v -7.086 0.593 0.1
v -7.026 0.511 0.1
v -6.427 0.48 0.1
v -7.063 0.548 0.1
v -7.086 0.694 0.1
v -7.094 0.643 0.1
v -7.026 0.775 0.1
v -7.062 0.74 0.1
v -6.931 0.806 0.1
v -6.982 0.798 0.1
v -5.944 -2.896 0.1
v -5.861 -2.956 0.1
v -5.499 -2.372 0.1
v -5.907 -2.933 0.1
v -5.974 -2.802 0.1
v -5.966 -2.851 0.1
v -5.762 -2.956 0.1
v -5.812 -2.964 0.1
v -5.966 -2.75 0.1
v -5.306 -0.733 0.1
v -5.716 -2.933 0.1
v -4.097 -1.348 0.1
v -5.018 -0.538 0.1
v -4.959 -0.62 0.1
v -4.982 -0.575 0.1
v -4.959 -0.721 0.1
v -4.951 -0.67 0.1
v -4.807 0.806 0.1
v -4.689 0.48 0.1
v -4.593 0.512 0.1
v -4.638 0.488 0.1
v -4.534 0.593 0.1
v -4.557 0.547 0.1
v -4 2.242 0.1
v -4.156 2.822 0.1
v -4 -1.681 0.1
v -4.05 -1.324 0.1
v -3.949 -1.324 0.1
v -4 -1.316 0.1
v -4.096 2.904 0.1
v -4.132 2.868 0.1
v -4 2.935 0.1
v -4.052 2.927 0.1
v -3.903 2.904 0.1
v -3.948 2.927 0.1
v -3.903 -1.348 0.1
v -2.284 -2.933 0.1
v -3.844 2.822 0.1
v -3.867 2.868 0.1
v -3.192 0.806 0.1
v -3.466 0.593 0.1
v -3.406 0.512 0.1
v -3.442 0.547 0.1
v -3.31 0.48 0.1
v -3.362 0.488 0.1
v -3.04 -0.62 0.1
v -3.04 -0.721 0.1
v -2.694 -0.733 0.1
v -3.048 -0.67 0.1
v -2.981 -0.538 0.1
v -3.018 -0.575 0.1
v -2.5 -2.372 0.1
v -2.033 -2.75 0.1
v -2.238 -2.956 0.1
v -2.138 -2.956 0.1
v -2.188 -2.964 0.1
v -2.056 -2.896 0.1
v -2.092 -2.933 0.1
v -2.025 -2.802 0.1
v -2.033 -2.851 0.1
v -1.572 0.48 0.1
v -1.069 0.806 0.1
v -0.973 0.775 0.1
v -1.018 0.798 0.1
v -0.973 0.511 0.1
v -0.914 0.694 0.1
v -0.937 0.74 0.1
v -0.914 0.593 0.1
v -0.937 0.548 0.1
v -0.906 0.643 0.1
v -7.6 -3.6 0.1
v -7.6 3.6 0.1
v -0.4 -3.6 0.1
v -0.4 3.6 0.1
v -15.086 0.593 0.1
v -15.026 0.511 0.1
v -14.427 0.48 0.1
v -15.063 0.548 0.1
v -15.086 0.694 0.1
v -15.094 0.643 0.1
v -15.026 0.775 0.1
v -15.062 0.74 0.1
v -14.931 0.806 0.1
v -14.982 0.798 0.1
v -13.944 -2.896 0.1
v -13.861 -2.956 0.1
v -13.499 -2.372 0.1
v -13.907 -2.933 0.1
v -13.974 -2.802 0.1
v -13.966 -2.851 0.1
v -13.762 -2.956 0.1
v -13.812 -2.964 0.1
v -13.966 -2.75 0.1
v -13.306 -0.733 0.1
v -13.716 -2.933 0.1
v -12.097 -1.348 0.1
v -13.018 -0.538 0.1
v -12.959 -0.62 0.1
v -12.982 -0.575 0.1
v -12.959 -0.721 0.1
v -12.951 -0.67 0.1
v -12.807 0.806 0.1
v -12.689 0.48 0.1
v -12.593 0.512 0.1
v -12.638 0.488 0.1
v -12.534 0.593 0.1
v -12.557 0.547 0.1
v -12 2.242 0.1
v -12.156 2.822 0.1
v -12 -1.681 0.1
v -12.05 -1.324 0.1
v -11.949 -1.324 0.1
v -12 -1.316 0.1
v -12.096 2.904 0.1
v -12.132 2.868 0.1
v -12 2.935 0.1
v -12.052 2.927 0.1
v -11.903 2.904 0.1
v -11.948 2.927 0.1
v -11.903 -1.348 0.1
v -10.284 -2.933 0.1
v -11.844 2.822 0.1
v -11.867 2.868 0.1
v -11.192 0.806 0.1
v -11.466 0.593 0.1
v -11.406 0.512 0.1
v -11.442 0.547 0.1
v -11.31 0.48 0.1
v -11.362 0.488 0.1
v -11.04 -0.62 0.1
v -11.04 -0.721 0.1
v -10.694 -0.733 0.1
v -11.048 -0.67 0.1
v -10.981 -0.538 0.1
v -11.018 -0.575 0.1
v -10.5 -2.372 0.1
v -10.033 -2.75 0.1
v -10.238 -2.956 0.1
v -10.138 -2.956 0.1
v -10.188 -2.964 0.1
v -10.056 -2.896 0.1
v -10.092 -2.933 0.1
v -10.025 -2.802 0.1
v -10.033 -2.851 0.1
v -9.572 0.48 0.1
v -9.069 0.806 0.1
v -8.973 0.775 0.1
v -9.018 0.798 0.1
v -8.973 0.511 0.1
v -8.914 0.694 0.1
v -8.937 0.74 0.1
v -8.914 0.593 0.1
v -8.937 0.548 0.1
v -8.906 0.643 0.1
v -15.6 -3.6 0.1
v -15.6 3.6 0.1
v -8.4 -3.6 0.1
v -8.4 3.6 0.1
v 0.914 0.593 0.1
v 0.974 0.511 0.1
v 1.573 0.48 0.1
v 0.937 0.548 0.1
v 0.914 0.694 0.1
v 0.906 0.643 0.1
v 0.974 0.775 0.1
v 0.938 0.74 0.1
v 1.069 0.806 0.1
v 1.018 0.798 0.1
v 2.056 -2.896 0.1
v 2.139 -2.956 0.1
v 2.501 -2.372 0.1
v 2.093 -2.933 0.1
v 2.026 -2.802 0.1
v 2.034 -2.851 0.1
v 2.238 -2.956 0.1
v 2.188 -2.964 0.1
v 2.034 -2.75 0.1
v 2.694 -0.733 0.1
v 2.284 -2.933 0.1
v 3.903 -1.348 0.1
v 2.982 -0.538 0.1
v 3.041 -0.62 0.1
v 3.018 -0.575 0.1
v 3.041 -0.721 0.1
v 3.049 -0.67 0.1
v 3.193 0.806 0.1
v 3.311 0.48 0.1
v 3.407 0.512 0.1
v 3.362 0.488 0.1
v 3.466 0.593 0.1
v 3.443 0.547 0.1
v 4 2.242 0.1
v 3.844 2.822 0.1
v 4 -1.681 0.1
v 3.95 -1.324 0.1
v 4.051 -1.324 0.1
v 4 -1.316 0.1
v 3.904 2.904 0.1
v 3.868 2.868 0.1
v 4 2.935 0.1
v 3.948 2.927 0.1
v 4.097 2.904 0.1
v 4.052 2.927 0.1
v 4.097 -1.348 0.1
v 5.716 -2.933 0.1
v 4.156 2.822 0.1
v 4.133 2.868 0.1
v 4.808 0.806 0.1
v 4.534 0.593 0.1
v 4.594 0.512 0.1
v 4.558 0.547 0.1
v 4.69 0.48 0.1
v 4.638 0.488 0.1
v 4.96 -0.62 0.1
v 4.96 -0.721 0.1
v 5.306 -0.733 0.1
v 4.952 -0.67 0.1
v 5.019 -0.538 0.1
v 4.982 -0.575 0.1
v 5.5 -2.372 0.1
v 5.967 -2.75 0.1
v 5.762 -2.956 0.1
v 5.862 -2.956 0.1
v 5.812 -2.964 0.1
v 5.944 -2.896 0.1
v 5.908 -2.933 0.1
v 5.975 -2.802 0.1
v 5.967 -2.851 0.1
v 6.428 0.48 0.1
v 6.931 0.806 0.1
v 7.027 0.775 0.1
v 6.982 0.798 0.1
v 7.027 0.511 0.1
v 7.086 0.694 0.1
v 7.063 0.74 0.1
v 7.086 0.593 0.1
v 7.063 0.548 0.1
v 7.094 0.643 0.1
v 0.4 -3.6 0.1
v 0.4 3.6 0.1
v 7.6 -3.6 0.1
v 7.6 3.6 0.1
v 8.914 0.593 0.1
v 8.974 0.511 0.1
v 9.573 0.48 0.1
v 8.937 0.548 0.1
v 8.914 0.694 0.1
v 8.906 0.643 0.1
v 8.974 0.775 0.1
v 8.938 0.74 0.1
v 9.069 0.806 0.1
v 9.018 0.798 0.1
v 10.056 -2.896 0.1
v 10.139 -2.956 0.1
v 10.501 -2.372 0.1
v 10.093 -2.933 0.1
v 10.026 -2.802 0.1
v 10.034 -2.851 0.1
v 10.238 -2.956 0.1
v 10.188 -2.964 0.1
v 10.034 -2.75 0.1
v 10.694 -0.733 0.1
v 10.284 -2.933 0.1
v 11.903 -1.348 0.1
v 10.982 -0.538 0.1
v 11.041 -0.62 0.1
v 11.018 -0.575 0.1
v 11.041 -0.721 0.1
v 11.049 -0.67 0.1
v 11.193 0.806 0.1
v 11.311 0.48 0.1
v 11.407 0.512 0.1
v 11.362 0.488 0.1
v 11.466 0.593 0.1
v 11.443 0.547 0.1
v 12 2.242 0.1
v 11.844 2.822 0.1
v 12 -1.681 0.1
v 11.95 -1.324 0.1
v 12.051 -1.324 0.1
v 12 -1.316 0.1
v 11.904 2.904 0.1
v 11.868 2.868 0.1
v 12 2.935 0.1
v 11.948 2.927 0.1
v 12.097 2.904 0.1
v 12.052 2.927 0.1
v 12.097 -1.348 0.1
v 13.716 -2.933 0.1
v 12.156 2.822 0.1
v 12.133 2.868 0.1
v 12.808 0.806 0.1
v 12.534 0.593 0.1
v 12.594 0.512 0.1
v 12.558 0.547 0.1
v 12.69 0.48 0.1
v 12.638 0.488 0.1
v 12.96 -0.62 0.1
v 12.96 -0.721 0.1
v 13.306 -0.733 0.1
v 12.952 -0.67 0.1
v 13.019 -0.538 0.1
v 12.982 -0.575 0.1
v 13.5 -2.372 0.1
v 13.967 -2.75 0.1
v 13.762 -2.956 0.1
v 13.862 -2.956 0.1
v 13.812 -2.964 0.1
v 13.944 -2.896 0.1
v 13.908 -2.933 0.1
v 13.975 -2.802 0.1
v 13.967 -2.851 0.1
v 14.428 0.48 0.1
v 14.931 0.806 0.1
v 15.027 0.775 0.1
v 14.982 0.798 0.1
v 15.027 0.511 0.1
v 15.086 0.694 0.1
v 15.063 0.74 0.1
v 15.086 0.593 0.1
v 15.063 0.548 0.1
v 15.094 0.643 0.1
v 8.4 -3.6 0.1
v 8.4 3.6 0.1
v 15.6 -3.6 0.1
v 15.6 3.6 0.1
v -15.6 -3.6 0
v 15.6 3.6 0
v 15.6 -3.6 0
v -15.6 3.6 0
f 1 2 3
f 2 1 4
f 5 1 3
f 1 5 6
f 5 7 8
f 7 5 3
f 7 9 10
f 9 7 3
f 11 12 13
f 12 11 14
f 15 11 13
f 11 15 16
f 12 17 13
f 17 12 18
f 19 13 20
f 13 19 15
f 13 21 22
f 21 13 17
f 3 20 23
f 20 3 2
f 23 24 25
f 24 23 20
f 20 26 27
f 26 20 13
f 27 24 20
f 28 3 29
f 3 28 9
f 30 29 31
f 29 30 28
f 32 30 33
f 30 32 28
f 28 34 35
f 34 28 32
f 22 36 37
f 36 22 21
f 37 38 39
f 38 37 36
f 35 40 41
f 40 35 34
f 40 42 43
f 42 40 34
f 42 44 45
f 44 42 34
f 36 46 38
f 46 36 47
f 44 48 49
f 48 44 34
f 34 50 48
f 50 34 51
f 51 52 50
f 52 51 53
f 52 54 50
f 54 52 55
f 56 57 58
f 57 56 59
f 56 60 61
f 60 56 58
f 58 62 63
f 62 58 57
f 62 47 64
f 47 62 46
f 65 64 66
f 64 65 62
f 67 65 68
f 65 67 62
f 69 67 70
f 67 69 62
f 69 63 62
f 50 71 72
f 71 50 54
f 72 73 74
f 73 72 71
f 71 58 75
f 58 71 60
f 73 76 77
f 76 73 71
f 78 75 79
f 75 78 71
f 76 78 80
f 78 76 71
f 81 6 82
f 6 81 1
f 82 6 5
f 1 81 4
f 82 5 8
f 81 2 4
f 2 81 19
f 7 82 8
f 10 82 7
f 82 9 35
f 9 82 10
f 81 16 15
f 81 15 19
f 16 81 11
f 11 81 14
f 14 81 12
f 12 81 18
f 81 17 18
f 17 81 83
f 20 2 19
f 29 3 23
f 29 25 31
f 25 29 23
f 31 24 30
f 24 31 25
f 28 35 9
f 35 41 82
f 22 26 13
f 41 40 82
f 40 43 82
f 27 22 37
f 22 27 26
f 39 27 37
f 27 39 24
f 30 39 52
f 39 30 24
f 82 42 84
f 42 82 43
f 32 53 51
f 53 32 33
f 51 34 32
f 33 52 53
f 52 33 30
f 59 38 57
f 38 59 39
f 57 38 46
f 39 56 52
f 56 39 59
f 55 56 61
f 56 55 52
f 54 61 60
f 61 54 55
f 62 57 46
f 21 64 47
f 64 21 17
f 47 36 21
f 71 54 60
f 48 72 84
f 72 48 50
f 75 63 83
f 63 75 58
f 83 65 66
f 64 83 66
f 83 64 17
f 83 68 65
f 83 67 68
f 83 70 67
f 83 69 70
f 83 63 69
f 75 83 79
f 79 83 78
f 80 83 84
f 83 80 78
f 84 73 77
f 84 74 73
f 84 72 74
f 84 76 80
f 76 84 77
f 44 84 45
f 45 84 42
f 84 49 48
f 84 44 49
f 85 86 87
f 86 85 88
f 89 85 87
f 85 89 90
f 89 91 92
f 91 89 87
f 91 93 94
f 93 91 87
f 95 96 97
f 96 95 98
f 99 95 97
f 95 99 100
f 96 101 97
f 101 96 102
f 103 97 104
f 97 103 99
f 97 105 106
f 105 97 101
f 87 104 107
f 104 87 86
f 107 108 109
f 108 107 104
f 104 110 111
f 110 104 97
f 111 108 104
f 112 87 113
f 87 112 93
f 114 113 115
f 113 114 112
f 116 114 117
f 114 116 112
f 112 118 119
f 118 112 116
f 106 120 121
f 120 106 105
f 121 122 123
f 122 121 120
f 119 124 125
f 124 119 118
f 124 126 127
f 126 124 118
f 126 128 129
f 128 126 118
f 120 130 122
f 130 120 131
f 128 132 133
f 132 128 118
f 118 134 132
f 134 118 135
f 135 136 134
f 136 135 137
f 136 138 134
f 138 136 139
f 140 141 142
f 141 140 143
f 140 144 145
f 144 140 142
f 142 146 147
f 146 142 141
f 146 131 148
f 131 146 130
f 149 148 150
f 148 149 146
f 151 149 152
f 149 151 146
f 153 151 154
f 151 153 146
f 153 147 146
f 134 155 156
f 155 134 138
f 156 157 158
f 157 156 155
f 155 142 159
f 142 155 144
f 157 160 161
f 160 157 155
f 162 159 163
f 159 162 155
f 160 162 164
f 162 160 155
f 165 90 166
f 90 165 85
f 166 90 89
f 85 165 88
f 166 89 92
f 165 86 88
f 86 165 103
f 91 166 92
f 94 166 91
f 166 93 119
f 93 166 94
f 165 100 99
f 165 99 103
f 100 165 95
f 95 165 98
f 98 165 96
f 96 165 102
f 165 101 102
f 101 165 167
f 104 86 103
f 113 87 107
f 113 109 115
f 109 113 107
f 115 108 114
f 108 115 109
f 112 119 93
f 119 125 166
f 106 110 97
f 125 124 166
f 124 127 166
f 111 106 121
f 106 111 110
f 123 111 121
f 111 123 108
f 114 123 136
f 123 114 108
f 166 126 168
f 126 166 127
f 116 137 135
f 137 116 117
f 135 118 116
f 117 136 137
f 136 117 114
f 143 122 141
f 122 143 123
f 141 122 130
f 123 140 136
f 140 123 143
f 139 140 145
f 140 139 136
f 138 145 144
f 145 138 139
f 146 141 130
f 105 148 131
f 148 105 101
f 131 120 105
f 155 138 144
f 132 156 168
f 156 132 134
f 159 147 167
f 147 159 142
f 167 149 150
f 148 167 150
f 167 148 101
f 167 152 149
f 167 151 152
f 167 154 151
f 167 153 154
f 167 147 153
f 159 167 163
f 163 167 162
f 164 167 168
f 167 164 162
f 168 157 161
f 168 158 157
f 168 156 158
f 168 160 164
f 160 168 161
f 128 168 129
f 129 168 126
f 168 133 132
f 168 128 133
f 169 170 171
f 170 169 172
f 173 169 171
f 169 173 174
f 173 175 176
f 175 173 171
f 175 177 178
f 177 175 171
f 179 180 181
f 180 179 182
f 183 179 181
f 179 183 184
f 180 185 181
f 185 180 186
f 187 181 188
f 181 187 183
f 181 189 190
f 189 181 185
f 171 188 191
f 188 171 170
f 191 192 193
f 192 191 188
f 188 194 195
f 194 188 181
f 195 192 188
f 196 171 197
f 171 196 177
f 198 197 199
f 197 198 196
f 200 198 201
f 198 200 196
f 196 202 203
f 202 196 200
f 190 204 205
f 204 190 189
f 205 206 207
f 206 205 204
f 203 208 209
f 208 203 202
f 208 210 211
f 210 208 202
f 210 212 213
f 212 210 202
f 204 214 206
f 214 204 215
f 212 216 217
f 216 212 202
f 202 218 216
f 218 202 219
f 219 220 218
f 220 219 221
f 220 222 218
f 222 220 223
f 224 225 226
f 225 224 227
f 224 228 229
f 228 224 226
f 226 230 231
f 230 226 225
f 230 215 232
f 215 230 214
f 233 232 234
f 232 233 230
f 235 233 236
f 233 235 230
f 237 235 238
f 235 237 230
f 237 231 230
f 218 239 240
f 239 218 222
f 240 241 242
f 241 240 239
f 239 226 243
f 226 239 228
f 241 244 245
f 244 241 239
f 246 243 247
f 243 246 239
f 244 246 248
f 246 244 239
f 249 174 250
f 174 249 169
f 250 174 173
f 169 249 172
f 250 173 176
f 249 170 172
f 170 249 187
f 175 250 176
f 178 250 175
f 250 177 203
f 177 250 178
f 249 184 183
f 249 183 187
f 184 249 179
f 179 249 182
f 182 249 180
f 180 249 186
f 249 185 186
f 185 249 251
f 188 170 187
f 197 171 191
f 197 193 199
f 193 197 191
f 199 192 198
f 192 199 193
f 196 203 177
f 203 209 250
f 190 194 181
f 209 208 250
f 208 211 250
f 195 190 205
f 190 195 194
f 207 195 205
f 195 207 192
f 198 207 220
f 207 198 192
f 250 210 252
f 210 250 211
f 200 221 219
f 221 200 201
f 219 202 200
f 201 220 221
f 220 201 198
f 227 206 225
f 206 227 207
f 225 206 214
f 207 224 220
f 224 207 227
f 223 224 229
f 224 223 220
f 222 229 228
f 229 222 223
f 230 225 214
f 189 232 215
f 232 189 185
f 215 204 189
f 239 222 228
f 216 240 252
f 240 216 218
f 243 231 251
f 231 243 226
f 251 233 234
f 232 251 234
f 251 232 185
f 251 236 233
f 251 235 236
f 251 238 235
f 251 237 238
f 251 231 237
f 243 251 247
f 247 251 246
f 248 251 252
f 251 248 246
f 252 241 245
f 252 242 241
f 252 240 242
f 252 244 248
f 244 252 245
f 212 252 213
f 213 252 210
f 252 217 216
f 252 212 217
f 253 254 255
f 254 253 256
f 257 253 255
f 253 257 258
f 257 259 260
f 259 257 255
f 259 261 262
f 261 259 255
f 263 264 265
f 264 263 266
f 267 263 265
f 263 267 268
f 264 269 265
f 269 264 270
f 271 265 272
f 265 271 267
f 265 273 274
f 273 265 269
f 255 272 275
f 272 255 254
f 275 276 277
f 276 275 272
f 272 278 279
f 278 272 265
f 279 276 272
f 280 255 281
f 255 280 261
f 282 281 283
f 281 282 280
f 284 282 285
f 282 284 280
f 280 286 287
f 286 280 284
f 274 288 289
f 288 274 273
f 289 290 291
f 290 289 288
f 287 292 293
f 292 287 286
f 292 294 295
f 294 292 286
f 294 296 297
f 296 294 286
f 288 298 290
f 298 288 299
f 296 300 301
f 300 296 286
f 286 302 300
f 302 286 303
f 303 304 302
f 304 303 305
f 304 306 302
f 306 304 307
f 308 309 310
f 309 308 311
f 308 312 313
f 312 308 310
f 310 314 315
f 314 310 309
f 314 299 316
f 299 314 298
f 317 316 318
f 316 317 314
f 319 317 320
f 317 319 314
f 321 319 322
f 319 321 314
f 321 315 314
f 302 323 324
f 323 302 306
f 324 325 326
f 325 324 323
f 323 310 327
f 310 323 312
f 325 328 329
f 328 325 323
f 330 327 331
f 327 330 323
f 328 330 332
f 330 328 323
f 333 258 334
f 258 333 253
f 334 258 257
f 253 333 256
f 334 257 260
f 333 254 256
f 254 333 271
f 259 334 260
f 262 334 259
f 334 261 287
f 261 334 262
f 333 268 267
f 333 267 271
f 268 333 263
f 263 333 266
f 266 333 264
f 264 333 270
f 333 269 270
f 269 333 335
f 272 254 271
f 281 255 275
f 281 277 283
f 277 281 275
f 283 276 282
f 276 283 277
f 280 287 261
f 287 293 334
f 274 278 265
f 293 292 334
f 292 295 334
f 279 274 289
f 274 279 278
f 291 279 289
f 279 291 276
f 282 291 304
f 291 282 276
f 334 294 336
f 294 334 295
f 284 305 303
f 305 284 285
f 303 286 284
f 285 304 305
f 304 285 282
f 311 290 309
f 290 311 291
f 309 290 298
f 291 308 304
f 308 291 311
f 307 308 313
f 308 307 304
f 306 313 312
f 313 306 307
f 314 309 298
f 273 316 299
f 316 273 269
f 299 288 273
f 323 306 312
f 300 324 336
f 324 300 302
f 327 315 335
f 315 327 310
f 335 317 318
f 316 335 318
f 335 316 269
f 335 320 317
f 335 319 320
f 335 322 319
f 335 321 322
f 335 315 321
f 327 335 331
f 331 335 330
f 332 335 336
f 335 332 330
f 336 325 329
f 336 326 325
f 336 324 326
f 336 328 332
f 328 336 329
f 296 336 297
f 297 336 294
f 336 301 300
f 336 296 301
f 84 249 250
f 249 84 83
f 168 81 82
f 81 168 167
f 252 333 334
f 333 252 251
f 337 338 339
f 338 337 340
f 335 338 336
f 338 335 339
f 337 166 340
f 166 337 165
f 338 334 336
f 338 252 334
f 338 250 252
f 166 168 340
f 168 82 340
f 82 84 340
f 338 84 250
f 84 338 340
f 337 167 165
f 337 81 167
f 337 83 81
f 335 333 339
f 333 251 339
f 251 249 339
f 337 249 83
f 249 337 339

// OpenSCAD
// file: ../p/box3u12.scad
use <../lib.scad>
function ldraw_lib__box3u12() = [
// 0 Box with 3 Parallel Faces without Any Edges
// 0 Name: box3u12.dat
// 0 Author: J.C. Tchang [tchang]
// 0 !LDRAW_ORG Primitive UPDATE 2014-02
// 0 !LICENSE Licensed under CC BY 2.0 and CC BY 4.0 : see CAreadme.txt
// 
// 0 BFC CERTIFY CCW
  [0,"BFC","CERTIFY"],
  [0,"BFC","CCW"],
// 
// 0 !HISTORY 2014-12-23 [PTadmin] Official Update 2014-02
// 
// 
// 4 16 -1 1 1 1 1 1 1 1 -1 -1 1 -1
  [4,16,-1,1,1,1,1,1,1,1,-1,-1,1,-1],
// 4 16 -1 1 1 -1 0 1 1 0 1 1 1 1
  [4,16,-1,1,1,-1,0,1,1,0,1,1,1,1],
// 4 16 1 1 -1 1 0 -1 -1 0 -1 -1 1 -1
  [4,16,1,1,-1,1,0,-1,-1,0,-1,-1,1,-1],
];
makepoly(ldraw_lib__box3u12(), line=0.2);
// main file
use <../lib.scad>
use <../p/box3u12.scad>
use <s/4107582ds01.scad>
function ldraw_lib__4107582d() = [
// 0 Sticker  0.9 x  3.9 with  4 White Stars with Black Border
// 0 Name: 4107582d.dat
// 0 Author: Damien Roux [Darats]
// 0 !LDRAW_ORG Part UPDATE 2014-02
// 0 !LICENSE Licensed under CC BY 2.0 and CC BY 4.0 : see CAreadme.txt
// 
// 0 BFC CERTIFY CCW
  [0,"BFC","CERTIFY"],
  [0,"BFC","CCW"],
// 
// 0 !KEYWORDS Set 5561
// 
// 0 !HISTORY 2014-12-23 [PTadmin] Official Update 2014-02
// 
// 
// 1 16 -10 -0.25 0 1 0 0 0 1 0 0 0 1 s\4107582ds01.dat
  [1,16,-10,-0.25,0,1,0,0,0,1,0,0,0,1, ldraw_lib__s__4107582ds01()],
// 1 16 -30 -0.25 0 1 0 0 0 1 0 0 0 1 s\4107582ds01.dat
  [1,16,-30,-0.25,0,1,0,0,0,1,0,0,0,1, ldraw_lib__s__4107582ds01()],
// 1 16 10 -0.25 0 1 0 0 0 1 0 0 0 1 s\4107582ds01.dat
  [1,16,10,-0.25,0,1,0,0,0,1,0,0,0,1, ldraw_lib__s__4107582ds01()],
// 1 16 30 -0.25 0 1 0 0 0 1 0 0 0 1 s\4107582ds01.dat
  [1,16,30,-0.25,0,1,0,0,0,1,0,0,0,1, ldraw_lib__s__4107582ds01()],
// 
// 4 16 -1 -0.25 -9 1 -0.25 -9 1 -0.25 9 -1 -0.25 9
  [4,16,-1,-0.25,-9,1,-0.25,-9,1,-0.25,9,-1,-0.25,9],
// 4 16 -21 -0.25 -9 -19 -0.25 -9 -19 -0.25 9 -21 -0.25 9
  [4,16,-21,-0.25,-9,-19,-0.25,-9,-19,-0.25,9,-21,-0.25,9],
// 4 16 19 -0.25 -9 21 -0.25 -9 21 -0.25 9 19 -0.25 9
  [4,16,19,-0.25,-9,21,-0.25,-9,21,-0.25,9,19,-0.25,9],
// 
// 1 16 0 -0.25 0 0 0 39 0 0.25 0 9 0 0 box3u12.dat
  [1,16,0,-0.25,0,0,0,39,0,0.25,0,9,0,0, ldraw_lib__box3u12()],
// 
// 3 16 39 0 9 21 -0.25 9 39 -0.25 9
  [3,16,39,0,9,21,-0.25,9,39,-0.25,9],
// 3 16 39 0 9 19 -0.25 9 21 -0.25 9
  [3,16,39,0,9,19,-0.25,9,21,-0.25,9],
// 3 16 39 0 9 1 -0.25 9 19 -0.25 9
  [3,16,39,0,9,1,-0.25,9,19,-0.25,9],
// 3 16 -39 -0.25 9 -21 -0.25 9 -39 0 9
  [3,16,-39,-0.25,9,-21,-0.25,9,-39,0,9],
// 3 16 -21 -0.25 9 -19 -0.25 9 -39 0 9
  [3,16,-21,-0.25,9,-19,-0.25,9,-39,0,9],
// 3 16 -19 -0.25 9 -1 -0.25 9 -39 0 9
  [3,16,-19,-0.25,9,-1,-0.25,9,-39,0,9],
// 4 16 39 0 9 -39 0 9 -1 -0.25 9 1 -0.25 9
  [4,16,39,0,9,-39,0,9,-1,-0.25,9,1,-0.25,9],
// 
// 3 16 -39 0 -9 -21 -0.25 -9 -39 -0.25 -9
  [3,16,-39,0,-9,-21,-0.25,-9,-39,-0.25,-9],
// 3 16 -39 0 -9 -19 -0.25 -9 -21 -0.25 -9
  [3,16,-39,0,-9,-19,-0.25,-9,-21,-0.25,-9],
// 3 16 -39 0 -9 -1 -0.25 -9 -19 -0.25 -9
  [3,16,-39,0,-9,-1,-0.25,-9,-19,-0.25,-9],
// 3 16 39 -0.25 -9 21 -0.25 -9 39 0 -9
  [3,16,39,-0.25,-9,21,-0.25,-9,39,0,-9],
// 3 16 21 -0.25 -9 19 -0.25 -9 39 0 -9
  [3,16,21,-0.25,-9,19,-0.25,-9,39,0,-9],
// 3 16 19 -0.25 -9 1 -0.25 -9 39 0 -9
  [3,16,19,-0.25,-9,1,-0.25,-9,39,0,-9],
// 4 16 -39 0 -9 39 0 -9 1 -0.25 -9 -1 -0.25 -9
  [4,16,-39,0,-9,39,0,-9,1,-0.25,-9,-1,-0.25,-9],
];
makepoly(ldraw_lib__4107582d(), line=0.2);
